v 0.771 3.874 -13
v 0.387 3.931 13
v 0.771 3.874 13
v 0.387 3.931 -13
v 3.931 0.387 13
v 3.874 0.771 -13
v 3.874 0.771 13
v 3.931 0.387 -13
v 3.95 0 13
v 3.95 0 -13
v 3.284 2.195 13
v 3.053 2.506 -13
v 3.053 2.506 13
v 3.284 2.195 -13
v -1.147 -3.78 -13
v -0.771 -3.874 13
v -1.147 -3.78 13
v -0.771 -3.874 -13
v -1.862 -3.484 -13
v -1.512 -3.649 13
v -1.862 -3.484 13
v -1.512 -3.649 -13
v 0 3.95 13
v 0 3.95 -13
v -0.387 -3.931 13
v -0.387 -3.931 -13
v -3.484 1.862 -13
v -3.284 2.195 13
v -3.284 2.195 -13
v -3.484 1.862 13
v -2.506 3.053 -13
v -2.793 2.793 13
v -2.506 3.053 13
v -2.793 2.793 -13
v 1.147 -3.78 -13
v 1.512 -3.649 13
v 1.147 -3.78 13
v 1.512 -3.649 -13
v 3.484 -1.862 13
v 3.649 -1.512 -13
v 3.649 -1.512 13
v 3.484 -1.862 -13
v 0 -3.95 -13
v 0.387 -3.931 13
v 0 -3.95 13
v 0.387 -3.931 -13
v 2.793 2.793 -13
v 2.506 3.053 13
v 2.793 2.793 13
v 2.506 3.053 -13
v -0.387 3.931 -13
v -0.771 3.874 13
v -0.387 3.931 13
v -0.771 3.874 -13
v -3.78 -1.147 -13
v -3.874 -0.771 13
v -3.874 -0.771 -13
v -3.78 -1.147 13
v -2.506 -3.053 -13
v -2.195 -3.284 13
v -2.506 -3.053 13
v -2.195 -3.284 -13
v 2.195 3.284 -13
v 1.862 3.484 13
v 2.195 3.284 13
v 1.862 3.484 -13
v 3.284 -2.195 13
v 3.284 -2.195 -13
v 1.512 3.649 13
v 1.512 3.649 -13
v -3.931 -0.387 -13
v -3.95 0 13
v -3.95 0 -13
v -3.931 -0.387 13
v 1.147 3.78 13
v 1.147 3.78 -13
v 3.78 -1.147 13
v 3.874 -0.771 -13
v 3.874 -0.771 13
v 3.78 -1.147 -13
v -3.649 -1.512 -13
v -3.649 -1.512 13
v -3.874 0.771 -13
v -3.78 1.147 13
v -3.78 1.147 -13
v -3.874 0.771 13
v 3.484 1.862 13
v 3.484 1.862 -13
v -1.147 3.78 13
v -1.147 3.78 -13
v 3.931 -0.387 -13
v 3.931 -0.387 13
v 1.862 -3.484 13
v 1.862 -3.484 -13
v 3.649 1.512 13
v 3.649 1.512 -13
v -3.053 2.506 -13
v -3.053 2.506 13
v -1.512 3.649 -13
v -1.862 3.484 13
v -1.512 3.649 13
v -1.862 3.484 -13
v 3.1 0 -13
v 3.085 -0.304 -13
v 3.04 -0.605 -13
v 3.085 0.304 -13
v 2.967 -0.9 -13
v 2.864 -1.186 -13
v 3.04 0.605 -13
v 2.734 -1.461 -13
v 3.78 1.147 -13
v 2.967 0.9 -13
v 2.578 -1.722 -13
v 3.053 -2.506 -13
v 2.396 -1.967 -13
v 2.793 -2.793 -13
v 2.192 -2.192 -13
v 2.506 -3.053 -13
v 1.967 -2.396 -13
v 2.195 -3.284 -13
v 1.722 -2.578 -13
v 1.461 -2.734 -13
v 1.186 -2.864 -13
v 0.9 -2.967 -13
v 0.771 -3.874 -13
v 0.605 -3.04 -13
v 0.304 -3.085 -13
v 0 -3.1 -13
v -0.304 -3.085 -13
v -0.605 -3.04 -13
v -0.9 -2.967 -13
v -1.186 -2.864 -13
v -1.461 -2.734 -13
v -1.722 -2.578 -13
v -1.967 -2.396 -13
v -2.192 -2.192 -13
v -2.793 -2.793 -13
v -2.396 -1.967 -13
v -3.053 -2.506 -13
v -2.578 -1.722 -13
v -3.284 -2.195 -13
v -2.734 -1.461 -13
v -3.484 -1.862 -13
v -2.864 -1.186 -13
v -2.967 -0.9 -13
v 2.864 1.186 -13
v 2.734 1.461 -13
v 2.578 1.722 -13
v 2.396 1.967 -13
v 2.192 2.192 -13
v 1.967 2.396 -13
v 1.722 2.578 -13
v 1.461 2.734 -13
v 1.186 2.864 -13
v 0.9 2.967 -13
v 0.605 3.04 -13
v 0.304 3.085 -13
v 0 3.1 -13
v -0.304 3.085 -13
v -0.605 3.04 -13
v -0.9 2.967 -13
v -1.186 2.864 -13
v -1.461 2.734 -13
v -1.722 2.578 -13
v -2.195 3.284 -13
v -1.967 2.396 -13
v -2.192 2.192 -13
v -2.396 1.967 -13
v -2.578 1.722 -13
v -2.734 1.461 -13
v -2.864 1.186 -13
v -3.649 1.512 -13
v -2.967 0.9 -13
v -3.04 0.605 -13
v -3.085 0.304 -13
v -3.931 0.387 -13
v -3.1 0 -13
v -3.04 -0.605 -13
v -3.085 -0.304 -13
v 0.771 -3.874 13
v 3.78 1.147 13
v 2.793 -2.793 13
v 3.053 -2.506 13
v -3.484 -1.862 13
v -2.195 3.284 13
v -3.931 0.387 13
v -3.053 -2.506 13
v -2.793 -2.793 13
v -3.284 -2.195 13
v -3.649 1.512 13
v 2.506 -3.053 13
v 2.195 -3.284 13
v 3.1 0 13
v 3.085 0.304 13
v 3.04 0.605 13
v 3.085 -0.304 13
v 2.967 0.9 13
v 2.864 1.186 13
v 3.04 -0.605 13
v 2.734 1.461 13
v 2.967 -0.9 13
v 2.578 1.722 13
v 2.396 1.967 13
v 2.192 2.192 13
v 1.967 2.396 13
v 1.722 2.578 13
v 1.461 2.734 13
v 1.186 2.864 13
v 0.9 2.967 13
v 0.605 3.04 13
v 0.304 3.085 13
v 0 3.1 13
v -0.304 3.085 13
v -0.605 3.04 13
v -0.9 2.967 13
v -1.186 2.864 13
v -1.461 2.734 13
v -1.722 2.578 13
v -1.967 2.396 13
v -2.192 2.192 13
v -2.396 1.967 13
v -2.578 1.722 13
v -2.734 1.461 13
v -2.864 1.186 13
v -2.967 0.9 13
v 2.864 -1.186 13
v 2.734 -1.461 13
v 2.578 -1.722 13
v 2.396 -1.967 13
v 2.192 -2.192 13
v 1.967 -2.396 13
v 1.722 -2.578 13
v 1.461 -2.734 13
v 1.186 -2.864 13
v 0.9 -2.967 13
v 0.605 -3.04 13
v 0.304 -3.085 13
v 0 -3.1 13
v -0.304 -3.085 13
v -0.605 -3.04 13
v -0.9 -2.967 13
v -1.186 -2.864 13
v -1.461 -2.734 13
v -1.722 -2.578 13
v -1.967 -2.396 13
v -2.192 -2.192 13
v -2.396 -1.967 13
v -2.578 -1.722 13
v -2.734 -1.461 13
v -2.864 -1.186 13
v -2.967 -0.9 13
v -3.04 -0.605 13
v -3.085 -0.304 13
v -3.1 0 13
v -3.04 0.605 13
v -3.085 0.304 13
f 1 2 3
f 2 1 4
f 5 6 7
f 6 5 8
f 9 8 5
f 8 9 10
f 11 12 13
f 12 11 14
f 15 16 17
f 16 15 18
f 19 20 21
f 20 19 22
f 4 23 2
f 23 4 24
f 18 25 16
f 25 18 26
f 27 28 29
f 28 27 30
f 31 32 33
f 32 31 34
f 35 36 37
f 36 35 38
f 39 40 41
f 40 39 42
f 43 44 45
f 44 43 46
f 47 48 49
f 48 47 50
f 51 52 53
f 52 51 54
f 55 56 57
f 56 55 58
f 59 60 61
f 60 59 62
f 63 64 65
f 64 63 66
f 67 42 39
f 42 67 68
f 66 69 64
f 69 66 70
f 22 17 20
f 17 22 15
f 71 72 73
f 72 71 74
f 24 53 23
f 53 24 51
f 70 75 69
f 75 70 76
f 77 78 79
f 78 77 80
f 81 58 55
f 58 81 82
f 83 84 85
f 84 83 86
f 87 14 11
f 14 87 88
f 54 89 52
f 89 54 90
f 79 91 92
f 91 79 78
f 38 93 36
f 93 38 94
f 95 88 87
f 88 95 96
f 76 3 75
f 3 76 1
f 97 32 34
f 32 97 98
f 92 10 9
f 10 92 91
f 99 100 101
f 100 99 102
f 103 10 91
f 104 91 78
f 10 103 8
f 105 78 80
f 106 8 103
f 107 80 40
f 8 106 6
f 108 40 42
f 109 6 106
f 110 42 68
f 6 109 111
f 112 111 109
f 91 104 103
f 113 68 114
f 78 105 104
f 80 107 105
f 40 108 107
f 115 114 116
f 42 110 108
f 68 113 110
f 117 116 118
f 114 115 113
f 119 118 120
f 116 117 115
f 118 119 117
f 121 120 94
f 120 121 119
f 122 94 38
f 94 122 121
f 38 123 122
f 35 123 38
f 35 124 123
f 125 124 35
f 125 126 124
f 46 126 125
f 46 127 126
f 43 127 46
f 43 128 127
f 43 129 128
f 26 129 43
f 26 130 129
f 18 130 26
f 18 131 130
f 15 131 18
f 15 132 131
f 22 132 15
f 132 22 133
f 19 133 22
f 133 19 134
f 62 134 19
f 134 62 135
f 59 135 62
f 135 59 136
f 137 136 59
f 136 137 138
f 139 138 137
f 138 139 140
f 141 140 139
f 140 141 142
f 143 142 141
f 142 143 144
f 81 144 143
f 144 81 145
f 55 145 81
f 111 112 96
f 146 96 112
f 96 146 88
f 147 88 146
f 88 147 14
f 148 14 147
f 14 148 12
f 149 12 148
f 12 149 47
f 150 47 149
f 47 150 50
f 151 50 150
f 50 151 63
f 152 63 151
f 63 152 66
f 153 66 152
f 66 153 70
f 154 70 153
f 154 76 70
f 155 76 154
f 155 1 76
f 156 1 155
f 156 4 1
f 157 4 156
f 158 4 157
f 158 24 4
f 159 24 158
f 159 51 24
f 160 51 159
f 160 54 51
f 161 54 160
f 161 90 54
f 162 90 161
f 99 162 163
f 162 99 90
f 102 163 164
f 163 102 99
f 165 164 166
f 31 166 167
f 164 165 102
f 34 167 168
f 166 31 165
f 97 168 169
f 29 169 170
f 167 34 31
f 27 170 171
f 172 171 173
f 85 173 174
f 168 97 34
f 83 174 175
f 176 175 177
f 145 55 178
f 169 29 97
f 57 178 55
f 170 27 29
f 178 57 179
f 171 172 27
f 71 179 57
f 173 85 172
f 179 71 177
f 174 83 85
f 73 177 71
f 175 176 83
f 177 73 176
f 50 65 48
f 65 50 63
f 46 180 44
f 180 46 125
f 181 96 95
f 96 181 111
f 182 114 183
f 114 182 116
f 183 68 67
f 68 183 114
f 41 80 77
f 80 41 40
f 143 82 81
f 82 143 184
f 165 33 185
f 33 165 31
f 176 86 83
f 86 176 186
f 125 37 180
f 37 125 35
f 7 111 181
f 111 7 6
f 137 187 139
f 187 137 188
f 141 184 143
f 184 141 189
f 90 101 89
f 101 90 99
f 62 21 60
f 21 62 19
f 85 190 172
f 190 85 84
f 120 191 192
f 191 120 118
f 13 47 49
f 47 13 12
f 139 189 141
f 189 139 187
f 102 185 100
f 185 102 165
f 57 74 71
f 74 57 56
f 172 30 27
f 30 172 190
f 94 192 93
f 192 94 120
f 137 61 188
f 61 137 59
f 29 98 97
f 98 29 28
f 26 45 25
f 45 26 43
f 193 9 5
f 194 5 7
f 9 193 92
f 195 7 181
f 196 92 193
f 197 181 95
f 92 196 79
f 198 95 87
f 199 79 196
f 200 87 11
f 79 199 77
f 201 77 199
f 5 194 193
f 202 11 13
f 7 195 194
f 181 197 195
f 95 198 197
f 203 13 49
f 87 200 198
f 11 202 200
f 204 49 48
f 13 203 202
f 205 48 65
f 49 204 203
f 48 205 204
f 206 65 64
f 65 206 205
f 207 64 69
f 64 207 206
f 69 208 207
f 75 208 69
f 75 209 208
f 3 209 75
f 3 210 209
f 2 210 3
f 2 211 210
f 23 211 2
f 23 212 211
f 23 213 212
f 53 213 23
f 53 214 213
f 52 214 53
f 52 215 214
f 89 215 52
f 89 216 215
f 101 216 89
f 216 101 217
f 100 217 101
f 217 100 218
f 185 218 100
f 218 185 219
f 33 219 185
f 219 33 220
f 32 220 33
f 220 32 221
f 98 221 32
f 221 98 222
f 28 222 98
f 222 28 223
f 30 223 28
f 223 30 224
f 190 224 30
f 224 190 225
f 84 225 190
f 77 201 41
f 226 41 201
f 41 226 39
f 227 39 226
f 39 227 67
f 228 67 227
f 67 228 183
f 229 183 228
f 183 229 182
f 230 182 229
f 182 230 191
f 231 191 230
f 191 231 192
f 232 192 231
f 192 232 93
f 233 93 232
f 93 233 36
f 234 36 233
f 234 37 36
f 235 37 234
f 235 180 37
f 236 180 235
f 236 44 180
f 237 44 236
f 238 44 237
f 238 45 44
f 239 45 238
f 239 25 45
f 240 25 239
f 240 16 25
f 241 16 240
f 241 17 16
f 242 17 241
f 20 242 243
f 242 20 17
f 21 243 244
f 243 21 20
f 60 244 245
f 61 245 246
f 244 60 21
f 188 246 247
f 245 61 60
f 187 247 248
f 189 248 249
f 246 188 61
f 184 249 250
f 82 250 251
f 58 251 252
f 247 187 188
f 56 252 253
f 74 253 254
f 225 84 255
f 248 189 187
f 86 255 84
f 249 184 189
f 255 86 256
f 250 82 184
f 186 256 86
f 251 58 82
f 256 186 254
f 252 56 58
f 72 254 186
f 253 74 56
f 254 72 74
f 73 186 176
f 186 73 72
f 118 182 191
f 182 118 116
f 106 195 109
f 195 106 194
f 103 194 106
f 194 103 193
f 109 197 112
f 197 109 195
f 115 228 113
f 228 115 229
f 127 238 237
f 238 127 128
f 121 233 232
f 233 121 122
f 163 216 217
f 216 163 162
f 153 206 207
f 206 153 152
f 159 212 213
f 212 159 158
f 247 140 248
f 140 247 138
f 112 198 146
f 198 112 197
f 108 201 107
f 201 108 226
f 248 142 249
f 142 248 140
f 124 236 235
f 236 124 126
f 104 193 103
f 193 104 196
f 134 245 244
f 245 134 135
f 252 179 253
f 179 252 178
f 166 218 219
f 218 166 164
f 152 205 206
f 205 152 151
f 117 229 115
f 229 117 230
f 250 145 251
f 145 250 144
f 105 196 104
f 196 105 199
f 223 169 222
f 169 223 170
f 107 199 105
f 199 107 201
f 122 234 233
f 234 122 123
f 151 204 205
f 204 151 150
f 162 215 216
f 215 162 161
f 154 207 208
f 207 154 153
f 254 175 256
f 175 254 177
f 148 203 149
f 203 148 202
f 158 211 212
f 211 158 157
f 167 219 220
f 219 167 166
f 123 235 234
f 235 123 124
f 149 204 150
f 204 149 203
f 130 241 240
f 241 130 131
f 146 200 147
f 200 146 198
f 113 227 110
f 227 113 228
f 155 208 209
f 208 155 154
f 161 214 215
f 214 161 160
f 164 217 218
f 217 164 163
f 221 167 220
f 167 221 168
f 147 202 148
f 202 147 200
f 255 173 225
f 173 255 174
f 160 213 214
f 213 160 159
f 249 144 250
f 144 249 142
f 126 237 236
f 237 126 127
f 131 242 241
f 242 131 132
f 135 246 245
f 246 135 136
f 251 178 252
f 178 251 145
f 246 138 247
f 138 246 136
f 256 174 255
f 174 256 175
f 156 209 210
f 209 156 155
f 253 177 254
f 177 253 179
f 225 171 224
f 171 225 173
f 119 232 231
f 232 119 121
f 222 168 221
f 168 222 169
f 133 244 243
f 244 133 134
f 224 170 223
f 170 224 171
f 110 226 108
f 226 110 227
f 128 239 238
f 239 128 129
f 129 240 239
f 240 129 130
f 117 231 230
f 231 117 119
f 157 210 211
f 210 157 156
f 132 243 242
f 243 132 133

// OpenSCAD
$fn=64;


difference(){
    cylinder(h=26, d=8-0.1,center= true);
    cylinder(h=30, d=6+0.2,center= true);
    
}
